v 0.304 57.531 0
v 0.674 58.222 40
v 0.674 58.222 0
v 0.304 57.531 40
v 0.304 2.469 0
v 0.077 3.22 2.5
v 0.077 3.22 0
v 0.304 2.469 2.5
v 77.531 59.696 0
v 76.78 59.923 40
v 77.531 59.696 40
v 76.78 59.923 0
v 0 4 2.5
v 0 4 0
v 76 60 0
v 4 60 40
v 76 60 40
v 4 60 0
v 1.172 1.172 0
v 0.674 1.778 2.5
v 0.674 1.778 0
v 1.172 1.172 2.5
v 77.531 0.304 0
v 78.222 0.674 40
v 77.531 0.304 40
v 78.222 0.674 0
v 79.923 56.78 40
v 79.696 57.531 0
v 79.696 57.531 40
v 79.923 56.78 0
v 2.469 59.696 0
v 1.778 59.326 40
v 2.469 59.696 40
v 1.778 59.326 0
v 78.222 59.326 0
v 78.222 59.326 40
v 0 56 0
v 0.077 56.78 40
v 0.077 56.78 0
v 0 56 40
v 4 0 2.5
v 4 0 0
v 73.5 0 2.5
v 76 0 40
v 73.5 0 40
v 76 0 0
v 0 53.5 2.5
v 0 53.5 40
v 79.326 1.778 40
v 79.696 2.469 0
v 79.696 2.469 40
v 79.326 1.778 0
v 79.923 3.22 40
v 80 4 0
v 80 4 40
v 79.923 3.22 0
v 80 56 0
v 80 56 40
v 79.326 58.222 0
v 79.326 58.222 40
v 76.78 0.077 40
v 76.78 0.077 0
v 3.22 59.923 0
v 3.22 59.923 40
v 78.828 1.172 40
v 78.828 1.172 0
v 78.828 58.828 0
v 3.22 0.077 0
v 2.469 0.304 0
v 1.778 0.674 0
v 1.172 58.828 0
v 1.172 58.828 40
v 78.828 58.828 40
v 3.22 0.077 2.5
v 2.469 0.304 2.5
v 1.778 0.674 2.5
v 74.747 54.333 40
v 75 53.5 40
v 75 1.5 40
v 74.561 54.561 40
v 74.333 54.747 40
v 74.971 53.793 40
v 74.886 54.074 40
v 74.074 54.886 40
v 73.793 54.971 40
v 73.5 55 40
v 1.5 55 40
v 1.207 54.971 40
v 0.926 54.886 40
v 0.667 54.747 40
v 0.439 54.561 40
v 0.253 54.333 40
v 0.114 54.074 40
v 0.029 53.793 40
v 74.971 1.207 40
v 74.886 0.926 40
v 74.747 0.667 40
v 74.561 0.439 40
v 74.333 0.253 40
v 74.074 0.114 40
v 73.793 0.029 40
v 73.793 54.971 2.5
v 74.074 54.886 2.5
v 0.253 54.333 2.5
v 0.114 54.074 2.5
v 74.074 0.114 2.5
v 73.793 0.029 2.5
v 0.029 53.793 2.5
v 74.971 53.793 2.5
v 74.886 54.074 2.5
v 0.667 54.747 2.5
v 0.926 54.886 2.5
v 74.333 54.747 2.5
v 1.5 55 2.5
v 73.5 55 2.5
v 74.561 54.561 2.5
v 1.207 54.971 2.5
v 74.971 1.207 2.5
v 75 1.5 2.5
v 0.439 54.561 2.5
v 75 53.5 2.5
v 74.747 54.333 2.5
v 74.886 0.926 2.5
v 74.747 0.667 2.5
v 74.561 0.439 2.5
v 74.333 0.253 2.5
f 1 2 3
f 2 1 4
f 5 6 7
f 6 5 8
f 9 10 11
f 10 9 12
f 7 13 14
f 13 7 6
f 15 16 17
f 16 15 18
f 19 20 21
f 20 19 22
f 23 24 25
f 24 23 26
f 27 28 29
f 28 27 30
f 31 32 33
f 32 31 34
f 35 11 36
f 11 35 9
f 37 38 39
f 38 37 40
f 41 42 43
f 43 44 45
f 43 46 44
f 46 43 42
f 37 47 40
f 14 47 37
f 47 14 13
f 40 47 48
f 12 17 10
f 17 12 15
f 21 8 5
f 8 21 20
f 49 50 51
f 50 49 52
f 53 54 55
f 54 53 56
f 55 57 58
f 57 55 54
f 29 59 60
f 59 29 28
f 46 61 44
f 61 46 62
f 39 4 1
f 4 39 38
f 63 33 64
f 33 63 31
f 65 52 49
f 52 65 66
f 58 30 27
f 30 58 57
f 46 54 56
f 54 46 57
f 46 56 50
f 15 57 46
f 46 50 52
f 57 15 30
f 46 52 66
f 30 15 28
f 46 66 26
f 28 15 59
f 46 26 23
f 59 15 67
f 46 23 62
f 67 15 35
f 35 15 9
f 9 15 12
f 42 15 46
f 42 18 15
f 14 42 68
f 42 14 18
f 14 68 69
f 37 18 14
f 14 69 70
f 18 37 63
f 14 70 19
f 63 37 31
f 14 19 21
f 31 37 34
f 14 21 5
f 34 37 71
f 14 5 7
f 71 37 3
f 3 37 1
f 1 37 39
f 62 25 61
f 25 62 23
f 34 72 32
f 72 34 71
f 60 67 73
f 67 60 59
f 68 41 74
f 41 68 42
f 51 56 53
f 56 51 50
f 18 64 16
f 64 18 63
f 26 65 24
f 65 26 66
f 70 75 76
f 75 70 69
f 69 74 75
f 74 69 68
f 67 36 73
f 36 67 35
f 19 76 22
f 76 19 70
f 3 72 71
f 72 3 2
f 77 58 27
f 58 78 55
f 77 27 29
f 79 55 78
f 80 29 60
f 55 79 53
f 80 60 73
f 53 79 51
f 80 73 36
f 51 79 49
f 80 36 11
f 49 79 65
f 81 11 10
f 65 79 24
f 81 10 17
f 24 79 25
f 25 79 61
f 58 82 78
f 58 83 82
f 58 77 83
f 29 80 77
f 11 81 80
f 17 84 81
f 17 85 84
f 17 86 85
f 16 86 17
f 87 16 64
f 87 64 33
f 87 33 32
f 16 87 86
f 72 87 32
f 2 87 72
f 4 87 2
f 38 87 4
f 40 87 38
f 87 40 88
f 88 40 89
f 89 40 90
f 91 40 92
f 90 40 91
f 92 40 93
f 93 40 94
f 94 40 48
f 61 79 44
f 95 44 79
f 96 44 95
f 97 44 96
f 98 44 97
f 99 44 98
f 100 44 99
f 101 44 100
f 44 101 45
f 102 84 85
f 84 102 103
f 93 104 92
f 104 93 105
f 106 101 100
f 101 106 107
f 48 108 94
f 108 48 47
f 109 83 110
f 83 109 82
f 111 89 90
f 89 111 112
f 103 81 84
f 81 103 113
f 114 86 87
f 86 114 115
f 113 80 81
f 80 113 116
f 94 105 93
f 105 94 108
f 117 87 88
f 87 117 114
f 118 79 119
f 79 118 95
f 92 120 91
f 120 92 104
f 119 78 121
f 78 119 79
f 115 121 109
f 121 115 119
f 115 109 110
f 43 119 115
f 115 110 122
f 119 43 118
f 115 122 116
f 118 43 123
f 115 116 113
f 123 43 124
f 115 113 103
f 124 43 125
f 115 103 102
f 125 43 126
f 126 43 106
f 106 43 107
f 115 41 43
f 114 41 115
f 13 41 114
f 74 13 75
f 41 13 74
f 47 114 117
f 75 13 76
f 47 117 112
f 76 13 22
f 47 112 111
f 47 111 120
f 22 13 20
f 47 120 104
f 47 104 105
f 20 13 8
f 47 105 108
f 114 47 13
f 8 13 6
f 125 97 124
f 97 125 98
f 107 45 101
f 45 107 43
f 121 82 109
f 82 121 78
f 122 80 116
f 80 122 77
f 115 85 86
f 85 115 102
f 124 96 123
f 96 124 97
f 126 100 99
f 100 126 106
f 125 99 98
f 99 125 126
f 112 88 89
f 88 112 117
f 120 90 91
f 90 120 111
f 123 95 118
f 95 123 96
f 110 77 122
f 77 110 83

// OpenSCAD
// KataCraft sample model: parametric open storage box
length = 80;
width = 60;
height = 40;
wall = 2.5;

module rounded_rect(l, w, r) {
  hull() {
    for (x = [r, l - r])
      for (y = [r, w - r])
        translate([x, y]) circle(r = r, $fn = 32);
  }
}

difference() {
  linear_extrude(height = height) rounded_rect(length, width, 4);
  translate([0, 0, wall])
    linear_extrude(height = height) rounded_rect(length - 2 * wall, width - 2 * wall, max(4 - wall, 1));
}
